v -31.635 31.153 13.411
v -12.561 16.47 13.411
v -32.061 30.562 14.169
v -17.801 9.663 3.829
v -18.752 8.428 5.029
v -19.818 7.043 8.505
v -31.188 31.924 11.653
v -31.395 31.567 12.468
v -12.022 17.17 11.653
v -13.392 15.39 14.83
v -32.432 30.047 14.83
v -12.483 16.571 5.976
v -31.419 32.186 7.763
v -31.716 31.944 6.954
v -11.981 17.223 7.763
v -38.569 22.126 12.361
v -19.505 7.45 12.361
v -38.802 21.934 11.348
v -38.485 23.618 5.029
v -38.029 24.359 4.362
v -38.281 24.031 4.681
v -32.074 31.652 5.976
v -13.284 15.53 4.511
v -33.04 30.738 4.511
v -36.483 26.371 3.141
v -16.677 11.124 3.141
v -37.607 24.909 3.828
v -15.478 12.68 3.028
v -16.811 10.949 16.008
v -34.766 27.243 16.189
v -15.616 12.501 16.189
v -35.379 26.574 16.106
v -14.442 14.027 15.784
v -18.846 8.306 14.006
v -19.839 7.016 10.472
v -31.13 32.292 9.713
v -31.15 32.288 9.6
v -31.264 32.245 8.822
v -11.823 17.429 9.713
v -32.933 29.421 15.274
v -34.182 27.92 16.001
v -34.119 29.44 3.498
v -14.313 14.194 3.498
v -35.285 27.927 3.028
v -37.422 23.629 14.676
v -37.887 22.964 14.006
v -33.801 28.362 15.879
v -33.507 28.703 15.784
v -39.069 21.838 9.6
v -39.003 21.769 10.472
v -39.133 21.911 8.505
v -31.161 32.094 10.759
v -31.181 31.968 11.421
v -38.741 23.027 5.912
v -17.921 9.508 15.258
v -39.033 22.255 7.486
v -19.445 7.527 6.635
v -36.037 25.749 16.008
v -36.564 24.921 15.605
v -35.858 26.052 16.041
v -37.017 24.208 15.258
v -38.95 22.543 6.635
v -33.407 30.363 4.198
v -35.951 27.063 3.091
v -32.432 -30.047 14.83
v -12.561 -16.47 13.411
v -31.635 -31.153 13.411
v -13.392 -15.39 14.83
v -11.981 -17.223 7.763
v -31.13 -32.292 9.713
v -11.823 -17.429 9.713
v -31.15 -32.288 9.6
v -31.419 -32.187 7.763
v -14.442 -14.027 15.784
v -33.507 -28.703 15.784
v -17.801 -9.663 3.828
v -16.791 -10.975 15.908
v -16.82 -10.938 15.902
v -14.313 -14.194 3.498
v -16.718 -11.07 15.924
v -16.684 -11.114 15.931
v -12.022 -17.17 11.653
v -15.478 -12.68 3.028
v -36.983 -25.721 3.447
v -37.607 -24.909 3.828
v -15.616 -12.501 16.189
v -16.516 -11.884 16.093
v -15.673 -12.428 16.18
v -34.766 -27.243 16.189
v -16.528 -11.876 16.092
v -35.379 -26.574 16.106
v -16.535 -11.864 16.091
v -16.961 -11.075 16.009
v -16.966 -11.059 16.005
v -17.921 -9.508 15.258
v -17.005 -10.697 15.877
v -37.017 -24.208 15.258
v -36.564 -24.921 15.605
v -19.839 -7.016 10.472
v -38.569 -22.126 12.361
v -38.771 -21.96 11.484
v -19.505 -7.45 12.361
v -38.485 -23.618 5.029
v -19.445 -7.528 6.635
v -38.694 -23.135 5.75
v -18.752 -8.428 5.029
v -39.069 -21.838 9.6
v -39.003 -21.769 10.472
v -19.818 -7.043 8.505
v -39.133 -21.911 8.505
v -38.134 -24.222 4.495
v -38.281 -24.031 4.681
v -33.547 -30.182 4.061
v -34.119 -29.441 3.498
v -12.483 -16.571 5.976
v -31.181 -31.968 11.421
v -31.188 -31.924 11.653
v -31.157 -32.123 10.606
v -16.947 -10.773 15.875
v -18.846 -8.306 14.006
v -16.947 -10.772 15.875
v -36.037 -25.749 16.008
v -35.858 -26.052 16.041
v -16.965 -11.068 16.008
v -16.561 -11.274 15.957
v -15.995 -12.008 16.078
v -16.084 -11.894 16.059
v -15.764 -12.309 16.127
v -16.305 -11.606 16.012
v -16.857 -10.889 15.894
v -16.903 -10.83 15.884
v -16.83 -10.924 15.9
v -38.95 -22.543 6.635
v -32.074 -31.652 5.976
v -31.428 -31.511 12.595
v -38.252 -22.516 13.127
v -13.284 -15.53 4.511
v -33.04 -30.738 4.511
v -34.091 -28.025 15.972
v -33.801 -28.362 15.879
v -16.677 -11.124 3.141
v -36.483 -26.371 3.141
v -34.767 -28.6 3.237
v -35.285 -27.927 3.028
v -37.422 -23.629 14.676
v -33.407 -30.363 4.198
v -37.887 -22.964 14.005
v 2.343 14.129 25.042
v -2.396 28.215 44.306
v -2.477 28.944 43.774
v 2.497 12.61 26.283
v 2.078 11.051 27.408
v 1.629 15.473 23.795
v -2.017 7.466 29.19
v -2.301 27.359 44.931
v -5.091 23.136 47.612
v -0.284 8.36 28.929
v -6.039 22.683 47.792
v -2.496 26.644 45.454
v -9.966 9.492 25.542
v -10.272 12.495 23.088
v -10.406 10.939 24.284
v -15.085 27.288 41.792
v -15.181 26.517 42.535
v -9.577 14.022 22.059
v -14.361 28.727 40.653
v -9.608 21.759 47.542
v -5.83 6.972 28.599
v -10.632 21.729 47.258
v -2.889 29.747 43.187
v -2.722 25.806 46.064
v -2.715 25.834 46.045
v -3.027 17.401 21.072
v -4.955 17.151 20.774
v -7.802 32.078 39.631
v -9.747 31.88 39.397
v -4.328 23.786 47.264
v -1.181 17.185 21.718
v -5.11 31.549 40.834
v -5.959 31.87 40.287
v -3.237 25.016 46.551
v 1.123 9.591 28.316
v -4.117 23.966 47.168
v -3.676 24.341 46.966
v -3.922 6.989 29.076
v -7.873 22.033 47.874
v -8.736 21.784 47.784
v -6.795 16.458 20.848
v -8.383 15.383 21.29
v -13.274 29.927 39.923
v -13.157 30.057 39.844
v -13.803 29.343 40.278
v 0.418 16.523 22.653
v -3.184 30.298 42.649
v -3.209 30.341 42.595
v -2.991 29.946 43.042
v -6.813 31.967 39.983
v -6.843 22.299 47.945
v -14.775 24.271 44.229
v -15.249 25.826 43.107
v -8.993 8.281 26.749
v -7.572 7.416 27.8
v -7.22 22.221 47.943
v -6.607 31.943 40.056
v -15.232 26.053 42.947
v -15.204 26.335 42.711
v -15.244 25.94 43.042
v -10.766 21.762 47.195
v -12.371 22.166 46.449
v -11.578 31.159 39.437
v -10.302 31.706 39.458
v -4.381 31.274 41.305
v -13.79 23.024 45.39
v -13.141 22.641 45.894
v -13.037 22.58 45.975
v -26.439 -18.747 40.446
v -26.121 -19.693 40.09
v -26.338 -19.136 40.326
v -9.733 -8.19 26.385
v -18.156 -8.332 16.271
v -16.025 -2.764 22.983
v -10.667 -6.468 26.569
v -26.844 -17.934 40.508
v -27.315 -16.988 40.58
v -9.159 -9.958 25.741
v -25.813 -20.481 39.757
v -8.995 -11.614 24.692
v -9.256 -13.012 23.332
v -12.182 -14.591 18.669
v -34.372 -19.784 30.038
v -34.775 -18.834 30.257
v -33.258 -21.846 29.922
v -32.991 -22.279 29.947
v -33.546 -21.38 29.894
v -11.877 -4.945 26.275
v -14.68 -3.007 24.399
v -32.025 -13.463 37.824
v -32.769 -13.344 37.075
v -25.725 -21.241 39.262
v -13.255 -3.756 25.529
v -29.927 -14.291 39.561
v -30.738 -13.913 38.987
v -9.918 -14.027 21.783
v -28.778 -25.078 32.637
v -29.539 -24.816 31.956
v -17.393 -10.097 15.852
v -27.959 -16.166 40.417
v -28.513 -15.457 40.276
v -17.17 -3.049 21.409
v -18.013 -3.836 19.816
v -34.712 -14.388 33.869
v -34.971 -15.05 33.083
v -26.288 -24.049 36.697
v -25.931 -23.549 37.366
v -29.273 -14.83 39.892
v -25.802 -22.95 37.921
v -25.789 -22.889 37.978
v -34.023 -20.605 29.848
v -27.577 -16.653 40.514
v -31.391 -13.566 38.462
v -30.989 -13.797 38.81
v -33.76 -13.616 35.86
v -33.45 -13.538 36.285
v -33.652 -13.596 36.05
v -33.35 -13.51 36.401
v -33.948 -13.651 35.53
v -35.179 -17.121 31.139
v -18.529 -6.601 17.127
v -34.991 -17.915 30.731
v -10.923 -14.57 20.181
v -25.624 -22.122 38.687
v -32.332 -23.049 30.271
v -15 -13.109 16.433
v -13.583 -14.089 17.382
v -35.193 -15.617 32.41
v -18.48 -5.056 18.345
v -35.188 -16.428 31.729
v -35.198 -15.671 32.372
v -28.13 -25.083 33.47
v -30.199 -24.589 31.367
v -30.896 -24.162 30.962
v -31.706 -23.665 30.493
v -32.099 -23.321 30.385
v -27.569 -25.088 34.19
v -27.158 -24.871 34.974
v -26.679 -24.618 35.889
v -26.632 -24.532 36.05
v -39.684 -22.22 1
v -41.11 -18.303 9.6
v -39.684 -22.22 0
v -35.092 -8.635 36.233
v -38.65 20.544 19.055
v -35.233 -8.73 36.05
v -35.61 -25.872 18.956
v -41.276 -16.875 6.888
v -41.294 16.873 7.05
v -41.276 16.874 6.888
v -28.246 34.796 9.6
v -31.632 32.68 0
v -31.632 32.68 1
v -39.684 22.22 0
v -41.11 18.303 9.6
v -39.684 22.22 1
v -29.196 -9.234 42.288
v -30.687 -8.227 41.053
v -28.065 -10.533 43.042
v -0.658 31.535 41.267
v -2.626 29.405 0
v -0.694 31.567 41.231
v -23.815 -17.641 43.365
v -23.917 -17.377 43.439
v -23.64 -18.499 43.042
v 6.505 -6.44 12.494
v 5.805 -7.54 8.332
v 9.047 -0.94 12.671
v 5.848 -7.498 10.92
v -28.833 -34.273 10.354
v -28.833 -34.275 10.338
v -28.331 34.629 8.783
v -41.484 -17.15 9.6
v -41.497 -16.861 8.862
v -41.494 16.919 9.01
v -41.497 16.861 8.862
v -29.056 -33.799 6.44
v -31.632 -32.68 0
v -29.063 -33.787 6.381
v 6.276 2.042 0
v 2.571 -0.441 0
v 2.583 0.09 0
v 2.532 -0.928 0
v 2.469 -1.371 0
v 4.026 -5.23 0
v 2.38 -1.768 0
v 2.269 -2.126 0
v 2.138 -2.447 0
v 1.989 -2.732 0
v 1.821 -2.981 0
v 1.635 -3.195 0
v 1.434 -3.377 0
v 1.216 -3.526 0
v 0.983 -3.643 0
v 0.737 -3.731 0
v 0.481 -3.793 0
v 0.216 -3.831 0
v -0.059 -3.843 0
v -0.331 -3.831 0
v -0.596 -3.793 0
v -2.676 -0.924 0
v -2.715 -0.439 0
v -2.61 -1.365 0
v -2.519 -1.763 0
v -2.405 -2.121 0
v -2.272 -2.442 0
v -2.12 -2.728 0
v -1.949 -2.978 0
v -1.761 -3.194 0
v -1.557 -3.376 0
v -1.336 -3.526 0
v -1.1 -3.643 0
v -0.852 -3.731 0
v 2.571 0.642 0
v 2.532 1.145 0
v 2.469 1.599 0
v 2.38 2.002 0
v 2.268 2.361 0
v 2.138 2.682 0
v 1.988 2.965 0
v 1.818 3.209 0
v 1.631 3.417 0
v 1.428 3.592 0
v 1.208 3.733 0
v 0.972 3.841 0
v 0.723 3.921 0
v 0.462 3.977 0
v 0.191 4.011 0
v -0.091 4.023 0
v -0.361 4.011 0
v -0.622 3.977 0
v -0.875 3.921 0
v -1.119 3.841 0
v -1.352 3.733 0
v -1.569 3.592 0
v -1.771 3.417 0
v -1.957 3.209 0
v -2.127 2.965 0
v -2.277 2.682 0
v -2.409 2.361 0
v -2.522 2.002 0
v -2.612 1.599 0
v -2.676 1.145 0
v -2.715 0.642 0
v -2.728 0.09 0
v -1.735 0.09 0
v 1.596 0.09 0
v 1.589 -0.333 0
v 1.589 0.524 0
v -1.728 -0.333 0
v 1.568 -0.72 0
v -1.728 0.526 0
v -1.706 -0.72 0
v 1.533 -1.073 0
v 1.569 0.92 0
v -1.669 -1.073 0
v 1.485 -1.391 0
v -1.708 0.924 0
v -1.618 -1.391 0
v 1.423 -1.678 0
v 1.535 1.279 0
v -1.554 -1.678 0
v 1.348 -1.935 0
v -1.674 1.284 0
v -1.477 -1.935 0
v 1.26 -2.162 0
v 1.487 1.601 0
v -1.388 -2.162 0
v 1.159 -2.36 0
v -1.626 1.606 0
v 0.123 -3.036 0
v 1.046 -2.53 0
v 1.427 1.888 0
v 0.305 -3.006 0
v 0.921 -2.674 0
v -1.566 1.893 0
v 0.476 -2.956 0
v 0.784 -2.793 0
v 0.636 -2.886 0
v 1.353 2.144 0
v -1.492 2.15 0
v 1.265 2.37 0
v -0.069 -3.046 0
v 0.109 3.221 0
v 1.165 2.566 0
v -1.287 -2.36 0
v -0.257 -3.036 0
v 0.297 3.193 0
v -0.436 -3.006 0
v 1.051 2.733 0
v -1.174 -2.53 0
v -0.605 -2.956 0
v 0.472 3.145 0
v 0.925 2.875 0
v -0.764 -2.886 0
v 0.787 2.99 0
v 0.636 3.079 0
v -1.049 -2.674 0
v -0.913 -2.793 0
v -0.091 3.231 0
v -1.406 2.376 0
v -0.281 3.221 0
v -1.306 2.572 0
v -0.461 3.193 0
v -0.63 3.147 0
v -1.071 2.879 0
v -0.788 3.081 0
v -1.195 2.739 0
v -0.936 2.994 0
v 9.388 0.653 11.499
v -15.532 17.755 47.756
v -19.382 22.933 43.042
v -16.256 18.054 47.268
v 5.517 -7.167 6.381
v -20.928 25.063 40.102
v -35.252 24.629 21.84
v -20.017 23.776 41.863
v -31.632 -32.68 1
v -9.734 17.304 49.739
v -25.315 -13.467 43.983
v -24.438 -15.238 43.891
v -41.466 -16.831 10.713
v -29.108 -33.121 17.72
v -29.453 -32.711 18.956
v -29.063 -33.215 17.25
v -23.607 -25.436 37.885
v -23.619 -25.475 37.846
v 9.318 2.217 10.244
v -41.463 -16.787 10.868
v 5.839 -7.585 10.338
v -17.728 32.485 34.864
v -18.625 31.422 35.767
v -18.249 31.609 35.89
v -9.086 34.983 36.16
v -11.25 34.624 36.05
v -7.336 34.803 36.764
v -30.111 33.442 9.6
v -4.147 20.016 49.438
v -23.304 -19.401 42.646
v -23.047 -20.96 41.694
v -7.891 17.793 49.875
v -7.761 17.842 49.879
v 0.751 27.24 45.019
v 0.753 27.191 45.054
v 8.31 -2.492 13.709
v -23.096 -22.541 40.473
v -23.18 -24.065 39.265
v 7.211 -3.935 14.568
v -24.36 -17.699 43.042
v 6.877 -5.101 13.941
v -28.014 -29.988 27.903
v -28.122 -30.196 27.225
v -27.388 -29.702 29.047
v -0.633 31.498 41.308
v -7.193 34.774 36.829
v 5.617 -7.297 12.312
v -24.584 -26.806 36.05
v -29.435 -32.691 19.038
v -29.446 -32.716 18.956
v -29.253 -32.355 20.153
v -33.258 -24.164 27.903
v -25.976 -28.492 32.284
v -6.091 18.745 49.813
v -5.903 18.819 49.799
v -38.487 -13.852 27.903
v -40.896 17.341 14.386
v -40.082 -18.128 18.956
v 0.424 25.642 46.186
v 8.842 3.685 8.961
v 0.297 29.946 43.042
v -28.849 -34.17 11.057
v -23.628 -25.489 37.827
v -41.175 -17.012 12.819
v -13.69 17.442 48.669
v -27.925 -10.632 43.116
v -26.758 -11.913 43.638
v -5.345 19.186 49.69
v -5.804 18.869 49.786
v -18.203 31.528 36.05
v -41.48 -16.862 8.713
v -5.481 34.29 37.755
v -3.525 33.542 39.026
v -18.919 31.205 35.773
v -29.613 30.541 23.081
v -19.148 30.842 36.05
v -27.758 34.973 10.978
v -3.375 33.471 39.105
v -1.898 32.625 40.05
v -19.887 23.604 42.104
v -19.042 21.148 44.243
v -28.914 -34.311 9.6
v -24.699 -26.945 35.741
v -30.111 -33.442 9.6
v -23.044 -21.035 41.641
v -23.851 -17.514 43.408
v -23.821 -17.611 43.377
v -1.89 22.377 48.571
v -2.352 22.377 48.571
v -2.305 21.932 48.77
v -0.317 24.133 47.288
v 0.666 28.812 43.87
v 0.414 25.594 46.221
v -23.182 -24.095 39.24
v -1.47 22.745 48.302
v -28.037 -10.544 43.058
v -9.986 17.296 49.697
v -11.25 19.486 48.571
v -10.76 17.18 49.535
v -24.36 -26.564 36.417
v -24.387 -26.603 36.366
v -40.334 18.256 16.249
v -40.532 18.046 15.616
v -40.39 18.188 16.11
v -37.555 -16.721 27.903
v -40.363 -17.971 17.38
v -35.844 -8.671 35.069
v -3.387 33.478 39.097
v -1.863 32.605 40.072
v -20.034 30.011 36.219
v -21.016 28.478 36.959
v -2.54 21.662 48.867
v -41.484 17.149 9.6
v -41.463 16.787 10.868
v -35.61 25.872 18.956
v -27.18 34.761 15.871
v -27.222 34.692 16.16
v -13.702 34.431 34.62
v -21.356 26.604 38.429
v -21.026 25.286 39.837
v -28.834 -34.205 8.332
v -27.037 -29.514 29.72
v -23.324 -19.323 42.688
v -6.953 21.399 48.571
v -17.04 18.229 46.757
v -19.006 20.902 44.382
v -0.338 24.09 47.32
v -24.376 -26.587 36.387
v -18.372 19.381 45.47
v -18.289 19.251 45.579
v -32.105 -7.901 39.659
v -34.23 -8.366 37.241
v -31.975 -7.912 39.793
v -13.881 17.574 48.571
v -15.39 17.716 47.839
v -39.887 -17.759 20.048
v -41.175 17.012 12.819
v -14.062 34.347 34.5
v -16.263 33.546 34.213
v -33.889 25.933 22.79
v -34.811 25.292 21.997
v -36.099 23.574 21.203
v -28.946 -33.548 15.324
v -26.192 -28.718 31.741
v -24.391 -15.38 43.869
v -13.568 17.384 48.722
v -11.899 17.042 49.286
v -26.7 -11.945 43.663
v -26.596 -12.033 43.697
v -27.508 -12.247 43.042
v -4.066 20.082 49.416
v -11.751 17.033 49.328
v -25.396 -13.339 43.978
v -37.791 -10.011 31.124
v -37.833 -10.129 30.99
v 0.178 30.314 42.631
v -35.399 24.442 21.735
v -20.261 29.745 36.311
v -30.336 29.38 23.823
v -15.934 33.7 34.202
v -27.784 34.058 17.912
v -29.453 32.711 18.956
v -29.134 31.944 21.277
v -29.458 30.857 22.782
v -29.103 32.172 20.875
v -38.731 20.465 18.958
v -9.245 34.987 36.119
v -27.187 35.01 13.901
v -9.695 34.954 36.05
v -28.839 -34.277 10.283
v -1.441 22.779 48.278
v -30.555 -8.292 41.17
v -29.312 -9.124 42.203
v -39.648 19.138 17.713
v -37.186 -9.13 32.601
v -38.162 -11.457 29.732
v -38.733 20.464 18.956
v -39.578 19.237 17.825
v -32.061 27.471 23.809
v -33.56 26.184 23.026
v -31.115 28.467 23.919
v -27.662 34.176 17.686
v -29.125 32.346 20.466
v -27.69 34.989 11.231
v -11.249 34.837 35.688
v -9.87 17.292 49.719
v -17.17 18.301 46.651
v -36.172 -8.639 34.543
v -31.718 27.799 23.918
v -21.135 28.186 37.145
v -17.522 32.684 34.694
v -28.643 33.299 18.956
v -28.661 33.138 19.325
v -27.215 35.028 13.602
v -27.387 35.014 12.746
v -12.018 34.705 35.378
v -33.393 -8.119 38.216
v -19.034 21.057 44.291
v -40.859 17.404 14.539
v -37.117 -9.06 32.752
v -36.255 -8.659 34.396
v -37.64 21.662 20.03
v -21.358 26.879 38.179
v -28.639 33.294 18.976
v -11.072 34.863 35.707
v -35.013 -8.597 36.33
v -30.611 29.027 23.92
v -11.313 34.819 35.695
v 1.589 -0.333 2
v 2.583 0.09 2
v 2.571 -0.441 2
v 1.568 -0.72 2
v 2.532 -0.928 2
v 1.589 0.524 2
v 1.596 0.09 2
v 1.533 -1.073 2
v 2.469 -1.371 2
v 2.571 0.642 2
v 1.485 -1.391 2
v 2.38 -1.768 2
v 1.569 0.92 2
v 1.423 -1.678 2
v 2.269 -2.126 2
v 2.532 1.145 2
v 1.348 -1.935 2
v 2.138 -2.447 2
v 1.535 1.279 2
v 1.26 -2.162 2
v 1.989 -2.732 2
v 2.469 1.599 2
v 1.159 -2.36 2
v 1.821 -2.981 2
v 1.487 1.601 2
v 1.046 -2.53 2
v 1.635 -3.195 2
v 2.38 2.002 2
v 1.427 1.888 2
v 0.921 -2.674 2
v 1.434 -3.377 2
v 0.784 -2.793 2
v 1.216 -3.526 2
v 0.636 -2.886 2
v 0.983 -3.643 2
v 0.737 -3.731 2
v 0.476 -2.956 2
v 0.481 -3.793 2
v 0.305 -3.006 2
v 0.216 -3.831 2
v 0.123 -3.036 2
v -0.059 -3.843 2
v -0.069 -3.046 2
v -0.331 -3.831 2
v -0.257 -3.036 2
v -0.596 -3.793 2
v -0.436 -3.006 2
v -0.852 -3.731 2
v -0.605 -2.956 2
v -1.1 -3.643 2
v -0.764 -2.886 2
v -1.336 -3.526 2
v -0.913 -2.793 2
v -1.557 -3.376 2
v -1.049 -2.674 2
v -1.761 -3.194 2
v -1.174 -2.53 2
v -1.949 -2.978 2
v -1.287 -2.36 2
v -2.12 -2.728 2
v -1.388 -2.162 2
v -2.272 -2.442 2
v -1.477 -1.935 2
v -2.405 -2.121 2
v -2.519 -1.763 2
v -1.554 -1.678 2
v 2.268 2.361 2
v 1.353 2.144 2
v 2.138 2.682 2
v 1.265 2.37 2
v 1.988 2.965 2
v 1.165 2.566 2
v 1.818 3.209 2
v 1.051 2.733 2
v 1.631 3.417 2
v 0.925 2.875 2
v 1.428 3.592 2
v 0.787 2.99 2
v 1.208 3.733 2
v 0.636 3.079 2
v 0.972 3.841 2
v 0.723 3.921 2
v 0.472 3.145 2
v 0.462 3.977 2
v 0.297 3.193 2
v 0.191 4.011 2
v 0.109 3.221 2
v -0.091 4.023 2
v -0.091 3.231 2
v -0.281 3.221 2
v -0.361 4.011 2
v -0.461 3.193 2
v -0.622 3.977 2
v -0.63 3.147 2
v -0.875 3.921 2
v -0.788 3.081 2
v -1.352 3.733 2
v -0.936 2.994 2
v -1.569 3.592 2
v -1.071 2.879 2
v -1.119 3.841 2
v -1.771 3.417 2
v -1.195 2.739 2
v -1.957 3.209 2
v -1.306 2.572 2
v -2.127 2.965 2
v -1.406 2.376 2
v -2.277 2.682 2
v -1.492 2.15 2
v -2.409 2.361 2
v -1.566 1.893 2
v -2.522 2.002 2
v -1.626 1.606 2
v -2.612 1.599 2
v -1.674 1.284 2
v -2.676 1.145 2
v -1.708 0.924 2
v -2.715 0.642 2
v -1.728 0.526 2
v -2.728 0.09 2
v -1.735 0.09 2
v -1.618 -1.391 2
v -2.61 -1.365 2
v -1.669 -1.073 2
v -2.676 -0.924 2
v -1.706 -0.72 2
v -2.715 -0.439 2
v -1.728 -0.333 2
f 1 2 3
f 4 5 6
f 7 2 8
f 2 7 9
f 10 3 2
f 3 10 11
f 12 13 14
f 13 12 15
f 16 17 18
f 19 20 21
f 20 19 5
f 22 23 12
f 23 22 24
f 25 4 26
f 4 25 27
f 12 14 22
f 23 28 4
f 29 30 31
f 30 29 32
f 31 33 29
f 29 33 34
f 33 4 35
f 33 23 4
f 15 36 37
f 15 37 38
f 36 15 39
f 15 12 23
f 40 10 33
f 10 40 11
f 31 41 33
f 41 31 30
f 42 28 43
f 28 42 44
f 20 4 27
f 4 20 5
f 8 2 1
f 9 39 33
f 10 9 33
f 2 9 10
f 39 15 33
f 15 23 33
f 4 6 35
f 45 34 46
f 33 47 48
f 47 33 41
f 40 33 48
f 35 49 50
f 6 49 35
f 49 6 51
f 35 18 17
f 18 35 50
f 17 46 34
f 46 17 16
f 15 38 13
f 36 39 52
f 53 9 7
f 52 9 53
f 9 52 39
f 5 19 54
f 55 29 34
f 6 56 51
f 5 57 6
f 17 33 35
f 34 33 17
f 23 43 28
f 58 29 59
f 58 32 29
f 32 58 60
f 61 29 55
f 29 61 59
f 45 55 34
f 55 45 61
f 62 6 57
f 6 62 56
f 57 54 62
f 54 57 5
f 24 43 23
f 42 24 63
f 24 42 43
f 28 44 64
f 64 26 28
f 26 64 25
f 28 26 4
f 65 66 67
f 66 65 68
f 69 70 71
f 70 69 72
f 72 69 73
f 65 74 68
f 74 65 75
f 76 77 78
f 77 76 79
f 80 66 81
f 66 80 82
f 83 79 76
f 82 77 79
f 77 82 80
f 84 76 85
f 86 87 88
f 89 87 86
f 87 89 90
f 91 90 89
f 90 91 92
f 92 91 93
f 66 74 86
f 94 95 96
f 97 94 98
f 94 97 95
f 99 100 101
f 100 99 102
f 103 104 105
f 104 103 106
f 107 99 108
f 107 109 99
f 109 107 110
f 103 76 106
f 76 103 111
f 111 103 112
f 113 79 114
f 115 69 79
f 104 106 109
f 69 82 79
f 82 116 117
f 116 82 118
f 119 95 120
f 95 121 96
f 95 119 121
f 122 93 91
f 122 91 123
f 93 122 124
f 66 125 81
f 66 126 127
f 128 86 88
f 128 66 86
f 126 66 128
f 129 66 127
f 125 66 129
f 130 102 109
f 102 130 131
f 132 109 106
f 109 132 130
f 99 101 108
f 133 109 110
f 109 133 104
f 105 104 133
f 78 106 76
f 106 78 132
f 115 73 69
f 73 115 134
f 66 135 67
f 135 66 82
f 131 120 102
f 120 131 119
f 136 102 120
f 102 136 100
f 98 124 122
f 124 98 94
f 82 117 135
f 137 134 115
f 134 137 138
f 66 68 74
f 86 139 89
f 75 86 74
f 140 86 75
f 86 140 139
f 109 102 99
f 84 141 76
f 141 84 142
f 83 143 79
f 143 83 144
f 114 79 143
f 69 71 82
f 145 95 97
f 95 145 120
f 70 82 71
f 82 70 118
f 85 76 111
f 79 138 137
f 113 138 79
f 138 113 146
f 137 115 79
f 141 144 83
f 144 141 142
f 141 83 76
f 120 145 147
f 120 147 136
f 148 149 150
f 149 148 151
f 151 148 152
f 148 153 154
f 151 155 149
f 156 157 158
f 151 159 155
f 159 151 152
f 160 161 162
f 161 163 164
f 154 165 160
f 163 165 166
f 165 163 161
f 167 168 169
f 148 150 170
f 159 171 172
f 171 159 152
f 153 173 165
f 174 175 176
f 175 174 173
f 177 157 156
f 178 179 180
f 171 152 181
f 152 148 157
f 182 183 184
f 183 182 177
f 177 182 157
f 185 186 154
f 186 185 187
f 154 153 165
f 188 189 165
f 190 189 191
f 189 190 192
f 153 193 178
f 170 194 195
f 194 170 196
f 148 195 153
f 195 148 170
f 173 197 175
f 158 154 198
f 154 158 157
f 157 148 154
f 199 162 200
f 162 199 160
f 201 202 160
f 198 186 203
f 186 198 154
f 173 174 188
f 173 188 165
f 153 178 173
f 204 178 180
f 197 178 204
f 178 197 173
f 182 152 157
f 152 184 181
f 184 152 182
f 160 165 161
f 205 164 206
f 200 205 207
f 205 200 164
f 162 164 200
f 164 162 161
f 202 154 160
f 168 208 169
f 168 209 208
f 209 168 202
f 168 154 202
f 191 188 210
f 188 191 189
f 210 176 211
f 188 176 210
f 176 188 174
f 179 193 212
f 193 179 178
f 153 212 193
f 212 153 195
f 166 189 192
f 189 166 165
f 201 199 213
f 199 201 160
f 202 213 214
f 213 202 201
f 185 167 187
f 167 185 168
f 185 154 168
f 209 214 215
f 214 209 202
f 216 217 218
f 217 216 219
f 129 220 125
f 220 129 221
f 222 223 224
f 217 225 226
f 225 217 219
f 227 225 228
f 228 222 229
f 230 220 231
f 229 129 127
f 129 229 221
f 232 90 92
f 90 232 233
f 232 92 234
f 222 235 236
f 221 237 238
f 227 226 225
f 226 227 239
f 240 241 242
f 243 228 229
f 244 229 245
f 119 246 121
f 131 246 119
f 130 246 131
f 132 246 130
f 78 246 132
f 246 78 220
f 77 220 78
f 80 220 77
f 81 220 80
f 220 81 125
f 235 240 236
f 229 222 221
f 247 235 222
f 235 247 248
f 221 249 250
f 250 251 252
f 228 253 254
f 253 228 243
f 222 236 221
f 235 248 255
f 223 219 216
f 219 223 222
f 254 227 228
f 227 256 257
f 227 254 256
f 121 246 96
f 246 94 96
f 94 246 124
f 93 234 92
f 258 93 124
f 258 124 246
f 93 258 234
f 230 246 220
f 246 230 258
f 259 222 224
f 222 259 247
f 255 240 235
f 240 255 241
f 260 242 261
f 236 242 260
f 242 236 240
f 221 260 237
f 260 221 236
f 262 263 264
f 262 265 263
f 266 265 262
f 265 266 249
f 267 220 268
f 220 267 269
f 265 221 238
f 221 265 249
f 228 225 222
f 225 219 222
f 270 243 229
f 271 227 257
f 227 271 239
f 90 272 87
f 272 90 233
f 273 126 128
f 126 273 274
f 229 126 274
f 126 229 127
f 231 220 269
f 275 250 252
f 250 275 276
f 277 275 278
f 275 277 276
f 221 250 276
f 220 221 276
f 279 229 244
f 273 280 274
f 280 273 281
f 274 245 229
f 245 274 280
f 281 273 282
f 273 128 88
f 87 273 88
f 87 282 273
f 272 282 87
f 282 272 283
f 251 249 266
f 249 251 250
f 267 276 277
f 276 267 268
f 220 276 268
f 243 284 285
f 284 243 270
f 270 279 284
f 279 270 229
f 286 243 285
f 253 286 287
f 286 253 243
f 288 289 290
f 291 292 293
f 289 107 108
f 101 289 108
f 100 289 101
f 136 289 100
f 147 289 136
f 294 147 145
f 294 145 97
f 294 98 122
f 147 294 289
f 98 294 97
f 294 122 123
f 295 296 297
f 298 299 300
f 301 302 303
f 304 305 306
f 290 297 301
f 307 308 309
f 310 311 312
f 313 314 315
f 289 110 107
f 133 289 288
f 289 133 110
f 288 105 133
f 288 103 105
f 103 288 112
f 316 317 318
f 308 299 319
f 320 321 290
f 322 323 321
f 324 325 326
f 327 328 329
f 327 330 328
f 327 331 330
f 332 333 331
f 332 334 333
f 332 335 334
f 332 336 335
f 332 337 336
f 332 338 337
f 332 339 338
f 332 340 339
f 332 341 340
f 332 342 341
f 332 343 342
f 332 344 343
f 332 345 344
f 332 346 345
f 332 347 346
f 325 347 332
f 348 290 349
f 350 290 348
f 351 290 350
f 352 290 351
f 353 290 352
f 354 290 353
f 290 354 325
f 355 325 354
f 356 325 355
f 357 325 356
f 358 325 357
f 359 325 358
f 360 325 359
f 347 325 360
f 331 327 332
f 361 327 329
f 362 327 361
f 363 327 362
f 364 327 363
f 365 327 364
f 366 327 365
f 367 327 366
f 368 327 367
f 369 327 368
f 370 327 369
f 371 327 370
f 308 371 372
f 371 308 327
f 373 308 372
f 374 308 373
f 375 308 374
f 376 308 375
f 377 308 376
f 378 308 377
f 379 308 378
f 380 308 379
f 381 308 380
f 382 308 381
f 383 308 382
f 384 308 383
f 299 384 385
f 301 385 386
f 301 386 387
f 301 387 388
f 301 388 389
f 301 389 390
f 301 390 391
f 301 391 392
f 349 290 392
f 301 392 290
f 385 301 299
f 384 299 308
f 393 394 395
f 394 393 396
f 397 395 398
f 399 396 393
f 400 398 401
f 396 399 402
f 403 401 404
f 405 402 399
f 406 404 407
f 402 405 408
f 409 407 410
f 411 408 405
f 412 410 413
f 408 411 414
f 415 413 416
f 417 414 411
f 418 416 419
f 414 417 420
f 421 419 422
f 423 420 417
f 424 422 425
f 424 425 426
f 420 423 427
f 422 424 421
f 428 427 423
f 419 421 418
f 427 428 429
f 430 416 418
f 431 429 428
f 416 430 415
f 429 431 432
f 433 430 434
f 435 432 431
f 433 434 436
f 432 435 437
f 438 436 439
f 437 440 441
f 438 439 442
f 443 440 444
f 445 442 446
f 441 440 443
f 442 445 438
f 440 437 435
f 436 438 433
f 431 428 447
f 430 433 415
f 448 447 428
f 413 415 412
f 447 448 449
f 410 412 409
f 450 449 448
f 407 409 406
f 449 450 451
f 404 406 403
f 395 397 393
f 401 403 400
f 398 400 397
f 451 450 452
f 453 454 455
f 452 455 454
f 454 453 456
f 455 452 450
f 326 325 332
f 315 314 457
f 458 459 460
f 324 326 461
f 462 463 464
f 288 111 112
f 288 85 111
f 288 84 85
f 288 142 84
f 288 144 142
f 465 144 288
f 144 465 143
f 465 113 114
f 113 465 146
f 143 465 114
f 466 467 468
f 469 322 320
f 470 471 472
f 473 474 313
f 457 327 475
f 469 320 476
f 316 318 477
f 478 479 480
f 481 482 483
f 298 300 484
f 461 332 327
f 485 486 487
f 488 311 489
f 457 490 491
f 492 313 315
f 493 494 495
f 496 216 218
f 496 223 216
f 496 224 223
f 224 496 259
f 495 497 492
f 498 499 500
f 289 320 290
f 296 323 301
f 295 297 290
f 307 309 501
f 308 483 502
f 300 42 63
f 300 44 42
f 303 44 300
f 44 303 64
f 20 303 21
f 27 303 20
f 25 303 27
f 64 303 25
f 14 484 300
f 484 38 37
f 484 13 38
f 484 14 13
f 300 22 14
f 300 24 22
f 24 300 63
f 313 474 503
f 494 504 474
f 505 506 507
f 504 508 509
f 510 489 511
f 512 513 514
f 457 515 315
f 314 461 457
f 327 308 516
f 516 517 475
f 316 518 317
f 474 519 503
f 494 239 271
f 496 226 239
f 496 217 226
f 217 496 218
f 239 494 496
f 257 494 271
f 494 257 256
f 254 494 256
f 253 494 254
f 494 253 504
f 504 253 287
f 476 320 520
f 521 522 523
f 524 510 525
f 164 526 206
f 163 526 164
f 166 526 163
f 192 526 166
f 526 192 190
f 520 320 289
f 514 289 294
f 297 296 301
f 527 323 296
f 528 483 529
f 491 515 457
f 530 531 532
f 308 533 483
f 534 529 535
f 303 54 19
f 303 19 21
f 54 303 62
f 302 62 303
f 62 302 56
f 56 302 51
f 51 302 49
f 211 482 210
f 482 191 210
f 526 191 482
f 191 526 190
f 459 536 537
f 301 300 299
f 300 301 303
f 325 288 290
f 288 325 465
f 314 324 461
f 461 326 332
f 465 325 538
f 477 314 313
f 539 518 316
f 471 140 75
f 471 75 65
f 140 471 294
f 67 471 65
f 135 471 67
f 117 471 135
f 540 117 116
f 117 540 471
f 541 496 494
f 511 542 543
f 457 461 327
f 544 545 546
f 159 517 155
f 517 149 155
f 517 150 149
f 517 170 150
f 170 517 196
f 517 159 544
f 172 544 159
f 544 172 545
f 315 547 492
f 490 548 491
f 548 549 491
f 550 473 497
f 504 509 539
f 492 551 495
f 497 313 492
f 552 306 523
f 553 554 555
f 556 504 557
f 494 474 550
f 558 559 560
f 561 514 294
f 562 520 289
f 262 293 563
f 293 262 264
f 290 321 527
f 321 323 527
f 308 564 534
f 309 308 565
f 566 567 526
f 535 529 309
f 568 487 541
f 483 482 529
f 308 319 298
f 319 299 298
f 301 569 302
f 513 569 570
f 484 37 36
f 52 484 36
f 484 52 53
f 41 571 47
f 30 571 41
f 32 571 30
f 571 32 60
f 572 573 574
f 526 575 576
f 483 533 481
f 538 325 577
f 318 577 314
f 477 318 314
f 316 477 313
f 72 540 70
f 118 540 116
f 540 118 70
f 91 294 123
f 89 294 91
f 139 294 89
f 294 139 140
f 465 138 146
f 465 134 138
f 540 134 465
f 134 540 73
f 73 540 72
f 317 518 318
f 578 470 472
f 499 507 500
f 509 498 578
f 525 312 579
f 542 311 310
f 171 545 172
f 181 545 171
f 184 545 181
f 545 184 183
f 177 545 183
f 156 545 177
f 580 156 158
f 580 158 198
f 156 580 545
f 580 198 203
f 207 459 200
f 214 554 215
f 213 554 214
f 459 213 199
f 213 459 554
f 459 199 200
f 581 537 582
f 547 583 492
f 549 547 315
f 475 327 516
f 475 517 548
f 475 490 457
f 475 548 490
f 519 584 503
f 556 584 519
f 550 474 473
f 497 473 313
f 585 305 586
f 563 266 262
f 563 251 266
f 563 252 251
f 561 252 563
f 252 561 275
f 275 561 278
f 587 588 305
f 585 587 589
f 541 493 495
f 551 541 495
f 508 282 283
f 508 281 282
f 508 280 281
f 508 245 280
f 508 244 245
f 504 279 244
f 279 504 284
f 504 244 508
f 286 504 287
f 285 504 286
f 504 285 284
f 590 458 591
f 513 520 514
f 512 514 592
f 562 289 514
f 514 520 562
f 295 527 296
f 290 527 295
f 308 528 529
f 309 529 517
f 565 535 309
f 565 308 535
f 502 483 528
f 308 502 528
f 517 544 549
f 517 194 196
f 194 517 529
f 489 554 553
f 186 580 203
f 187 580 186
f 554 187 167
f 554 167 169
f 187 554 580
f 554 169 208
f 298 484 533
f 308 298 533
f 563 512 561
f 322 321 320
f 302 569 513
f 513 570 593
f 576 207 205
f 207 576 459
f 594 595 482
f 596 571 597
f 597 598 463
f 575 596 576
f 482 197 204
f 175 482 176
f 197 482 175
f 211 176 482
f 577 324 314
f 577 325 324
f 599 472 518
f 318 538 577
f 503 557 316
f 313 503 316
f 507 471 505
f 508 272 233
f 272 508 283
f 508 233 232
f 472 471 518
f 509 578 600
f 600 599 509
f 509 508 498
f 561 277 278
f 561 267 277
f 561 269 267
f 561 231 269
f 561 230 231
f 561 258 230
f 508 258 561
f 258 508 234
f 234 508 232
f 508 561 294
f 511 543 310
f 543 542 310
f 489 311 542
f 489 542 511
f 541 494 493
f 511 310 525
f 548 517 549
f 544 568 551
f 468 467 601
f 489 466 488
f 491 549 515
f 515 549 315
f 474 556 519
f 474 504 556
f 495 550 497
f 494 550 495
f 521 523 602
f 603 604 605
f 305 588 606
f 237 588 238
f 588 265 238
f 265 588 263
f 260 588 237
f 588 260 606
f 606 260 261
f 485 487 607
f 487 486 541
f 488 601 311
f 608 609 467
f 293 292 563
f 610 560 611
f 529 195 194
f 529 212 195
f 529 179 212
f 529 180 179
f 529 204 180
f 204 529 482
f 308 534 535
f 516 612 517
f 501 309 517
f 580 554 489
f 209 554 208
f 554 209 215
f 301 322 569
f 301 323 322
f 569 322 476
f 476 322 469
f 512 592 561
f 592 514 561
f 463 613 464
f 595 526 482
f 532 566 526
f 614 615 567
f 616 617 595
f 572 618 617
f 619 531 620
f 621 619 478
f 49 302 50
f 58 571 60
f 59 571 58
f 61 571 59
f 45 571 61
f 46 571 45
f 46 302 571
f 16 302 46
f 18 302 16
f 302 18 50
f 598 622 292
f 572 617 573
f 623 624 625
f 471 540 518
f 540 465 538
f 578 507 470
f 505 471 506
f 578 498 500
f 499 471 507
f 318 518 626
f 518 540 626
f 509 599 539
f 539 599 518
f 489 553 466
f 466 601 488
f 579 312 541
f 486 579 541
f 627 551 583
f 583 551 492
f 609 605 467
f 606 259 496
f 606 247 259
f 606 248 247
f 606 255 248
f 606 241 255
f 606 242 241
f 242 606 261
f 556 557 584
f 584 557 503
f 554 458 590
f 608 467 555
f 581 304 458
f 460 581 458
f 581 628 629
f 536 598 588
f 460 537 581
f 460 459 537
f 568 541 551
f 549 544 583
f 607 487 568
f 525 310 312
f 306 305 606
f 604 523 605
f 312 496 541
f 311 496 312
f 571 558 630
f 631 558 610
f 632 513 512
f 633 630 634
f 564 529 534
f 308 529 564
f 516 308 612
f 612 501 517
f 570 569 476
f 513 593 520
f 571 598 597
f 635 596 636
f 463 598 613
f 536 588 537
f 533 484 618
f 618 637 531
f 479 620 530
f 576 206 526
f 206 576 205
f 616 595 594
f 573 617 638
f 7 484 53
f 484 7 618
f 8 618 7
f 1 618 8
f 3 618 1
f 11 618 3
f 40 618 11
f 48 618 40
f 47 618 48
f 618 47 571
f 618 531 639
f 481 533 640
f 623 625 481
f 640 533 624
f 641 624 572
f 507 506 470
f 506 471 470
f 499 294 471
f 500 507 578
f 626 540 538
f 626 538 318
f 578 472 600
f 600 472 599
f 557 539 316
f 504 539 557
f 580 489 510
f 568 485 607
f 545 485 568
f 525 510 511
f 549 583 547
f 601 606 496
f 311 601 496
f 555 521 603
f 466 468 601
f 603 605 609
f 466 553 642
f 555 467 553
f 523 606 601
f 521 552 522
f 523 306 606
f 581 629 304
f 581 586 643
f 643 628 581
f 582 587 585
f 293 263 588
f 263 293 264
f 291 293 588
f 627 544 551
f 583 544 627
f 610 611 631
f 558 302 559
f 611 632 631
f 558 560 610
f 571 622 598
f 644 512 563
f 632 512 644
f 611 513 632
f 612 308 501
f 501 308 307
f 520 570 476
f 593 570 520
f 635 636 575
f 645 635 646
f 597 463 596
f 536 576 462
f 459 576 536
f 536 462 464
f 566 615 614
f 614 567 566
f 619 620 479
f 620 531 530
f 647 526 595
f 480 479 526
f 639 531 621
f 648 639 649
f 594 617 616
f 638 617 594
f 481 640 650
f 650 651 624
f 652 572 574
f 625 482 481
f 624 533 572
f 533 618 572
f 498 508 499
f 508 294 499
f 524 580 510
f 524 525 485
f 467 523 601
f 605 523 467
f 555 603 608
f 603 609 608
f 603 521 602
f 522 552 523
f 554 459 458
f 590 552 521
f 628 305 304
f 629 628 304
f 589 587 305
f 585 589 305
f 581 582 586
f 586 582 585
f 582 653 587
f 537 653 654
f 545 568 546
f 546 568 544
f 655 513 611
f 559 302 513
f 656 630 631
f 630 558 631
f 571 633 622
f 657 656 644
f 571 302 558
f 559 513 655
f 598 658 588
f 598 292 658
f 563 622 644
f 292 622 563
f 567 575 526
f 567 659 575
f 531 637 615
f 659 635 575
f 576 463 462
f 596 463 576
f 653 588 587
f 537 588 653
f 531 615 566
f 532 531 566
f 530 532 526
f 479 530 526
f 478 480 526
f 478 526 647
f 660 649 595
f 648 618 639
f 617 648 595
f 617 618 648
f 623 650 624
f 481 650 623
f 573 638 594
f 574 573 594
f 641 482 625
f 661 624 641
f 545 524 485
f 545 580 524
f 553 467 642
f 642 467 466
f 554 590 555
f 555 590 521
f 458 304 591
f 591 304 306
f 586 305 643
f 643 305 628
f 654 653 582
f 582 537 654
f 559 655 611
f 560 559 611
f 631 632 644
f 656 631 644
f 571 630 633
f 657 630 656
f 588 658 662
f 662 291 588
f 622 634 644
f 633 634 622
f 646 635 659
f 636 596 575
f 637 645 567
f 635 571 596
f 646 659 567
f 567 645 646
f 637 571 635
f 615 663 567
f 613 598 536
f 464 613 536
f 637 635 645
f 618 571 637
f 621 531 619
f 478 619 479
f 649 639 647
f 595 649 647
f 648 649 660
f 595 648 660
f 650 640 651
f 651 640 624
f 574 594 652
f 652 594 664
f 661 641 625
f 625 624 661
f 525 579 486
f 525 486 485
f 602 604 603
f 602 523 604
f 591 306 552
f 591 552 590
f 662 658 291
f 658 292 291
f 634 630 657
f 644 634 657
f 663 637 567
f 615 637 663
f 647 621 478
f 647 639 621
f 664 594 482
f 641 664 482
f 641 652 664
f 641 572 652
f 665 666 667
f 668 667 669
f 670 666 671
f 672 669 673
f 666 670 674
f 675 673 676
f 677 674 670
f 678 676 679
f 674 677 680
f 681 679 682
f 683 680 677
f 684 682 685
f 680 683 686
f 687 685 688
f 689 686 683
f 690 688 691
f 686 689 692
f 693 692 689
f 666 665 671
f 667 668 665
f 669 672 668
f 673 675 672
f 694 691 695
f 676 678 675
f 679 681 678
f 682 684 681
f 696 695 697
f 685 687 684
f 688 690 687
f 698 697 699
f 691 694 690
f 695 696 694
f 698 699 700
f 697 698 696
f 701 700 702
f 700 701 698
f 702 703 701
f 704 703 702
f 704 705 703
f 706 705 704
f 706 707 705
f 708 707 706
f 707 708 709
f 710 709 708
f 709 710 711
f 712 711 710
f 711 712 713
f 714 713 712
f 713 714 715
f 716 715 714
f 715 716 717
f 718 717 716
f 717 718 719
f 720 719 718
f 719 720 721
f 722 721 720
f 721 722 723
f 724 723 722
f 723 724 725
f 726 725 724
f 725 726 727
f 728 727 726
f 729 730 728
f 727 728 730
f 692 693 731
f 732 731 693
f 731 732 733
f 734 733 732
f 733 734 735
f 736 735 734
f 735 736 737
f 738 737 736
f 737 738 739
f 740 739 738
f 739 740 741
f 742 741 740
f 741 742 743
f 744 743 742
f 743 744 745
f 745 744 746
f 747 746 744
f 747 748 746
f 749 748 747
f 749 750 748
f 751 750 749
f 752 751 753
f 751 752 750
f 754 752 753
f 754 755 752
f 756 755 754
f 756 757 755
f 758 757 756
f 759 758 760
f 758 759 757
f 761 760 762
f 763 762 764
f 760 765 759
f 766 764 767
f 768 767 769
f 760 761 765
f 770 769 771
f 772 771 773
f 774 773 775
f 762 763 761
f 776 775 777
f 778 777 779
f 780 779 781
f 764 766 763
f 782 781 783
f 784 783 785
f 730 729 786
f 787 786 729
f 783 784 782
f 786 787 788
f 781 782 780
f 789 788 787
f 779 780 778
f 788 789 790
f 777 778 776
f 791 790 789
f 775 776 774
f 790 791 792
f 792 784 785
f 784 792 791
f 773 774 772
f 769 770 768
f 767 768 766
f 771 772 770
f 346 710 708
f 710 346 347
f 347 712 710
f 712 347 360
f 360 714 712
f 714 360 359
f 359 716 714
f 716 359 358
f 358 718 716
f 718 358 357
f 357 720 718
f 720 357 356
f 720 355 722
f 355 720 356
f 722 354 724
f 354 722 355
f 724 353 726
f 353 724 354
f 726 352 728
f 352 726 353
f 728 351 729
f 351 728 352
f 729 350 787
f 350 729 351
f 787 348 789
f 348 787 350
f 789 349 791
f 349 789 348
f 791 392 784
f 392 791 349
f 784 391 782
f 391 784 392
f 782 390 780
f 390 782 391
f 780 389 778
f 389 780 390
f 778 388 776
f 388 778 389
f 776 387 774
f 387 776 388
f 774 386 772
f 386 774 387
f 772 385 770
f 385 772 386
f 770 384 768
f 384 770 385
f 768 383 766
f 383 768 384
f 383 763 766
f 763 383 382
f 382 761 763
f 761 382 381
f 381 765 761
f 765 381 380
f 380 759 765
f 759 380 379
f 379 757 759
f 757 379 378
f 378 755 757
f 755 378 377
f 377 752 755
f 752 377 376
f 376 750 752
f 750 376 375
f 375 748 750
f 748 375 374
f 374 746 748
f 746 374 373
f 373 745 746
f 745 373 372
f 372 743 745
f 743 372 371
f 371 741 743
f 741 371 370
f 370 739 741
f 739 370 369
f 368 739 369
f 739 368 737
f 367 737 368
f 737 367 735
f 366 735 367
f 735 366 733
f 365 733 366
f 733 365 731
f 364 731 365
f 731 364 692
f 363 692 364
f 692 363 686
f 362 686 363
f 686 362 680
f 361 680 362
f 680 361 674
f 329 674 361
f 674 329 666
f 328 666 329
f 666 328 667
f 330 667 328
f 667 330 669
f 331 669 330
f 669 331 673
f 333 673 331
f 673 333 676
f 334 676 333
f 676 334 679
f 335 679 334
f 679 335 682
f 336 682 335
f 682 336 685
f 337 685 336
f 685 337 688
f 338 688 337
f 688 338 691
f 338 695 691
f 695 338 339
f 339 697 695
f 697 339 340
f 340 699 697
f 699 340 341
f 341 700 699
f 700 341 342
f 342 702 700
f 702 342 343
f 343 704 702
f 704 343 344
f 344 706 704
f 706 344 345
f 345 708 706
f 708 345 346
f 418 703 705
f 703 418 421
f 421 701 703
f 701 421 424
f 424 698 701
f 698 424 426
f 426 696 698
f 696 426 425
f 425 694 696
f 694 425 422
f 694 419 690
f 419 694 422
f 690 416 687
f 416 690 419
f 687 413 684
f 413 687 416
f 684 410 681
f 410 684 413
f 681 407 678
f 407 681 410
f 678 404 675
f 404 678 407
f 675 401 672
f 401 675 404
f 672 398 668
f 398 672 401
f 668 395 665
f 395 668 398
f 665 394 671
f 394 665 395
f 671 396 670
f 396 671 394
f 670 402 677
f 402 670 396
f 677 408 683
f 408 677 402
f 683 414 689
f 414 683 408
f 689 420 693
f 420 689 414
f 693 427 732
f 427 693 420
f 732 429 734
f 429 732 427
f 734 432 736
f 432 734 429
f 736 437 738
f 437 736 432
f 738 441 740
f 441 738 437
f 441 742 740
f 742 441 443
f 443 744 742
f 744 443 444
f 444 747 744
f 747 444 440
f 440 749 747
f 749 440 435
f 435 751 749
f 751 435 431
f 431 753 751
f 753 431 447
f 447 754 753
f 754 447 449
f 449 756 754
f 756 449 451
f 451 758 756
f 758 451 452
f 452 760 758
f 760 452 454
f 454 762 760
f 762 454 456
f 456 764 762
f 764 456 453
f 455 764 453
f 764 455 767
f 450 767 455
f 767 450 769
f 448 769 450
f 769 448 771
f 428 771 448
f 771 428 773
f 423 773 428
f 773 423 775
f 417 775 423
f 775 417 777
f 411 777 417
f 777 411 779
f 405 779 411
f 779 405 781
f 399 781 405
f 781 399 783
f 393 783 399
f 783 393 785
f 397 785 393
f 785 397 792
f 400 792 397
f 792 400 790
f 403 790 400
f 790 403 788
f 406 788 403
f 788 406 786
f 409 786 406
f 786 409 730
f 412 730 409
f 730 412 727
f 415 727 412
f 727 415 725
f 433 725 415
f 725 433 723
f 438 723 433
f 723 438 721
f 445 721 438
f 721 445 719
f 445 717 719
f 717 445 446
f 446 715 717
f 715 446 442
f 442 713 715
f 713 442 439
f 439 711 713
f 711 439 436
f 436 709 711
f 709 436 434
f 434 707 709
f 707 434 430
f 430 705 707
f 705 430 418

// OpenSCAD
difference() {
	difference() {
		difference() {
			hull() {
				union() {
					union() {
						rotate(a = 142.4109105310, v = [0, 0, 1]) {
							translate(v = [0, -6.6000000000, 0]) {
								cube(size = [45.0000000000, 13.2000000000, 1]);
							}
						}
						rotate(a = -142.4109105310, v = [0, 0, 1]) {
							translate(v = [0, -6.6000000000, 0]) {
								cube(size = [45.0000000000, 13.2000000000, 1]);
							}
						}
						rotate(a = 108.0225105204, v = [0, 0, 1]) {
							translate(v = [0, -6.6000000000, 0]) {
								cube(size = [28.7746396149, 13.2000000000, 1]);
							}
						}
						rotate(a = -147.7117672506, v = [0, 0, 1]) {
							translate(v = [0, -6.6000000000, 0]) {
								cube(size = [36.6667092485, 13.2000000000, 1]);
							}
						}
					}
					translate(v = [0, 0, 9.6000063083]) {
						intersection() {
							hull() {
								rotate(a = 90.0000114961, v = [-0.6099942813, -0.7924058157, 0.0000014024]) {
									cylinder(h = 45, r = 9.6000000000);
								}
								rotate(a = 90.0000883836, v = [0.6099942813, -0.7924058157, 0.0000001824]) {
									cylinder(h = 45, r = 9.6000000000);
								}
								rotate(a = 39.7497720115, v = [-0.6080617410, -0.1978364069, 0.0000008059]) {
									cylinder(h = 45, r = 9.6000000000);
								}
								rotate(a = 54.5692278774, v = [0.4352578368, -0.6888226501, 0.0000002536]) {
									cylinder(h = 45, r = 9.6000000000);
								}
							}
							sphere(r = 45);
						}
					}
				}
			}
			translate(v = [0, 0, 9.6000063083]) {
				rotate(a = 90.0000114961, v = [-0.6099942813, -0.7924058157, 0.0000014024]) {
					translate(v = [0, 0, 20]) {
						cylinder(h = 45, r = 6.6000000000);
					}
				}
				rotate(a = 90.0000883836, v = [0.6099942813, -0.7924058157, 0.0000001824]) {
					translate(v = [0, 0, 20]) {
						cylinder(h = 45, r = 6.6000000000);
					}
				}
				rotate(a = 39.7497720115, v = [-0.6080617410, -0.1978364069, 0.0000008059]) {
					translate(v = [0, 0, 20]) {
						cylinder(h = 45, r = 6.6000000000);
					}
				}
				rotate(a = 54.5692278774, v = [0.4352578368, -0.6888226501, 0.0000002536]) {
					translate(v = [0, 0, 20]) {
						cylinder(h = 45, r = 6.6000000000);
					}
				}
			}
		}
		translate(v = [-100, -100, -100]) {
			cube(size = [200, 200, 100]);
		}
	}
	translate(v = [0, 0, 2]) {
		rotate(a = 180, v = [0, 1, 0]) {
			linear_extrude(height = 3) {
				text(halign = "center", size = 8, text = "0", valign = "center");
			}
		}
	}
}
